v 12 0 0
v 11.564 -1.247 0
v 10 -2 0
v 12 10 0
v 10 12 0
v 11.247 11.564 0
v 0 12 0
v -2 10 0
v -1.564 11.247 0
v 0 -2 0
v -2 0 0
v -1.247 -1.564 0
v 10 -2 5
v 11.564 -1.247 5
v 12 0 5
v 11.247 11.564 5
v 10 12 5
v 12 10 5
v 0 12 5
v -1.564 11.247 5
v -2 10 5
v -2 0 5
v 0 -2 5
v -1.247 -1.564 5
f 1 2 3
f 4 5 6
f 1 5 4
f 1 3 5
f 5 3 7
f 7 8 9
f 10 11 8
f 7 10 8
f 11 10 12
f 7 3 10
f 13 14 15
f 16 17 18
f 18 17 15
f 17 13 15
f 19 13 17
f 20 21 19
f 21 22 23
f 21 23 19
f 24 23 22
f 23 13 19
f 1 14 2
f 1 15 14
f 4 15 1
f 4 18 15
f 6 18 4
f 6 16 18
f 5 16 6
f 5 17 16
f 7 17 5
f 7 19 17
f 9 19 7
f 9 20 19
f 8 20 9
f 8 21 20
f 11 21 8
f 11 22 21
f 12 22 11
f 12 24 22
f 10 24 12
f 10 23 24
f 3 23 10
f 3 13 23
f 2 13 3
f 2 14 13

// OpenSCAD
// offset(): round-join grow wrapped in linear_extrude so the corpus test
// gets a solid.
linear_extrude(height = 5) offset(r = 2) square(10);
